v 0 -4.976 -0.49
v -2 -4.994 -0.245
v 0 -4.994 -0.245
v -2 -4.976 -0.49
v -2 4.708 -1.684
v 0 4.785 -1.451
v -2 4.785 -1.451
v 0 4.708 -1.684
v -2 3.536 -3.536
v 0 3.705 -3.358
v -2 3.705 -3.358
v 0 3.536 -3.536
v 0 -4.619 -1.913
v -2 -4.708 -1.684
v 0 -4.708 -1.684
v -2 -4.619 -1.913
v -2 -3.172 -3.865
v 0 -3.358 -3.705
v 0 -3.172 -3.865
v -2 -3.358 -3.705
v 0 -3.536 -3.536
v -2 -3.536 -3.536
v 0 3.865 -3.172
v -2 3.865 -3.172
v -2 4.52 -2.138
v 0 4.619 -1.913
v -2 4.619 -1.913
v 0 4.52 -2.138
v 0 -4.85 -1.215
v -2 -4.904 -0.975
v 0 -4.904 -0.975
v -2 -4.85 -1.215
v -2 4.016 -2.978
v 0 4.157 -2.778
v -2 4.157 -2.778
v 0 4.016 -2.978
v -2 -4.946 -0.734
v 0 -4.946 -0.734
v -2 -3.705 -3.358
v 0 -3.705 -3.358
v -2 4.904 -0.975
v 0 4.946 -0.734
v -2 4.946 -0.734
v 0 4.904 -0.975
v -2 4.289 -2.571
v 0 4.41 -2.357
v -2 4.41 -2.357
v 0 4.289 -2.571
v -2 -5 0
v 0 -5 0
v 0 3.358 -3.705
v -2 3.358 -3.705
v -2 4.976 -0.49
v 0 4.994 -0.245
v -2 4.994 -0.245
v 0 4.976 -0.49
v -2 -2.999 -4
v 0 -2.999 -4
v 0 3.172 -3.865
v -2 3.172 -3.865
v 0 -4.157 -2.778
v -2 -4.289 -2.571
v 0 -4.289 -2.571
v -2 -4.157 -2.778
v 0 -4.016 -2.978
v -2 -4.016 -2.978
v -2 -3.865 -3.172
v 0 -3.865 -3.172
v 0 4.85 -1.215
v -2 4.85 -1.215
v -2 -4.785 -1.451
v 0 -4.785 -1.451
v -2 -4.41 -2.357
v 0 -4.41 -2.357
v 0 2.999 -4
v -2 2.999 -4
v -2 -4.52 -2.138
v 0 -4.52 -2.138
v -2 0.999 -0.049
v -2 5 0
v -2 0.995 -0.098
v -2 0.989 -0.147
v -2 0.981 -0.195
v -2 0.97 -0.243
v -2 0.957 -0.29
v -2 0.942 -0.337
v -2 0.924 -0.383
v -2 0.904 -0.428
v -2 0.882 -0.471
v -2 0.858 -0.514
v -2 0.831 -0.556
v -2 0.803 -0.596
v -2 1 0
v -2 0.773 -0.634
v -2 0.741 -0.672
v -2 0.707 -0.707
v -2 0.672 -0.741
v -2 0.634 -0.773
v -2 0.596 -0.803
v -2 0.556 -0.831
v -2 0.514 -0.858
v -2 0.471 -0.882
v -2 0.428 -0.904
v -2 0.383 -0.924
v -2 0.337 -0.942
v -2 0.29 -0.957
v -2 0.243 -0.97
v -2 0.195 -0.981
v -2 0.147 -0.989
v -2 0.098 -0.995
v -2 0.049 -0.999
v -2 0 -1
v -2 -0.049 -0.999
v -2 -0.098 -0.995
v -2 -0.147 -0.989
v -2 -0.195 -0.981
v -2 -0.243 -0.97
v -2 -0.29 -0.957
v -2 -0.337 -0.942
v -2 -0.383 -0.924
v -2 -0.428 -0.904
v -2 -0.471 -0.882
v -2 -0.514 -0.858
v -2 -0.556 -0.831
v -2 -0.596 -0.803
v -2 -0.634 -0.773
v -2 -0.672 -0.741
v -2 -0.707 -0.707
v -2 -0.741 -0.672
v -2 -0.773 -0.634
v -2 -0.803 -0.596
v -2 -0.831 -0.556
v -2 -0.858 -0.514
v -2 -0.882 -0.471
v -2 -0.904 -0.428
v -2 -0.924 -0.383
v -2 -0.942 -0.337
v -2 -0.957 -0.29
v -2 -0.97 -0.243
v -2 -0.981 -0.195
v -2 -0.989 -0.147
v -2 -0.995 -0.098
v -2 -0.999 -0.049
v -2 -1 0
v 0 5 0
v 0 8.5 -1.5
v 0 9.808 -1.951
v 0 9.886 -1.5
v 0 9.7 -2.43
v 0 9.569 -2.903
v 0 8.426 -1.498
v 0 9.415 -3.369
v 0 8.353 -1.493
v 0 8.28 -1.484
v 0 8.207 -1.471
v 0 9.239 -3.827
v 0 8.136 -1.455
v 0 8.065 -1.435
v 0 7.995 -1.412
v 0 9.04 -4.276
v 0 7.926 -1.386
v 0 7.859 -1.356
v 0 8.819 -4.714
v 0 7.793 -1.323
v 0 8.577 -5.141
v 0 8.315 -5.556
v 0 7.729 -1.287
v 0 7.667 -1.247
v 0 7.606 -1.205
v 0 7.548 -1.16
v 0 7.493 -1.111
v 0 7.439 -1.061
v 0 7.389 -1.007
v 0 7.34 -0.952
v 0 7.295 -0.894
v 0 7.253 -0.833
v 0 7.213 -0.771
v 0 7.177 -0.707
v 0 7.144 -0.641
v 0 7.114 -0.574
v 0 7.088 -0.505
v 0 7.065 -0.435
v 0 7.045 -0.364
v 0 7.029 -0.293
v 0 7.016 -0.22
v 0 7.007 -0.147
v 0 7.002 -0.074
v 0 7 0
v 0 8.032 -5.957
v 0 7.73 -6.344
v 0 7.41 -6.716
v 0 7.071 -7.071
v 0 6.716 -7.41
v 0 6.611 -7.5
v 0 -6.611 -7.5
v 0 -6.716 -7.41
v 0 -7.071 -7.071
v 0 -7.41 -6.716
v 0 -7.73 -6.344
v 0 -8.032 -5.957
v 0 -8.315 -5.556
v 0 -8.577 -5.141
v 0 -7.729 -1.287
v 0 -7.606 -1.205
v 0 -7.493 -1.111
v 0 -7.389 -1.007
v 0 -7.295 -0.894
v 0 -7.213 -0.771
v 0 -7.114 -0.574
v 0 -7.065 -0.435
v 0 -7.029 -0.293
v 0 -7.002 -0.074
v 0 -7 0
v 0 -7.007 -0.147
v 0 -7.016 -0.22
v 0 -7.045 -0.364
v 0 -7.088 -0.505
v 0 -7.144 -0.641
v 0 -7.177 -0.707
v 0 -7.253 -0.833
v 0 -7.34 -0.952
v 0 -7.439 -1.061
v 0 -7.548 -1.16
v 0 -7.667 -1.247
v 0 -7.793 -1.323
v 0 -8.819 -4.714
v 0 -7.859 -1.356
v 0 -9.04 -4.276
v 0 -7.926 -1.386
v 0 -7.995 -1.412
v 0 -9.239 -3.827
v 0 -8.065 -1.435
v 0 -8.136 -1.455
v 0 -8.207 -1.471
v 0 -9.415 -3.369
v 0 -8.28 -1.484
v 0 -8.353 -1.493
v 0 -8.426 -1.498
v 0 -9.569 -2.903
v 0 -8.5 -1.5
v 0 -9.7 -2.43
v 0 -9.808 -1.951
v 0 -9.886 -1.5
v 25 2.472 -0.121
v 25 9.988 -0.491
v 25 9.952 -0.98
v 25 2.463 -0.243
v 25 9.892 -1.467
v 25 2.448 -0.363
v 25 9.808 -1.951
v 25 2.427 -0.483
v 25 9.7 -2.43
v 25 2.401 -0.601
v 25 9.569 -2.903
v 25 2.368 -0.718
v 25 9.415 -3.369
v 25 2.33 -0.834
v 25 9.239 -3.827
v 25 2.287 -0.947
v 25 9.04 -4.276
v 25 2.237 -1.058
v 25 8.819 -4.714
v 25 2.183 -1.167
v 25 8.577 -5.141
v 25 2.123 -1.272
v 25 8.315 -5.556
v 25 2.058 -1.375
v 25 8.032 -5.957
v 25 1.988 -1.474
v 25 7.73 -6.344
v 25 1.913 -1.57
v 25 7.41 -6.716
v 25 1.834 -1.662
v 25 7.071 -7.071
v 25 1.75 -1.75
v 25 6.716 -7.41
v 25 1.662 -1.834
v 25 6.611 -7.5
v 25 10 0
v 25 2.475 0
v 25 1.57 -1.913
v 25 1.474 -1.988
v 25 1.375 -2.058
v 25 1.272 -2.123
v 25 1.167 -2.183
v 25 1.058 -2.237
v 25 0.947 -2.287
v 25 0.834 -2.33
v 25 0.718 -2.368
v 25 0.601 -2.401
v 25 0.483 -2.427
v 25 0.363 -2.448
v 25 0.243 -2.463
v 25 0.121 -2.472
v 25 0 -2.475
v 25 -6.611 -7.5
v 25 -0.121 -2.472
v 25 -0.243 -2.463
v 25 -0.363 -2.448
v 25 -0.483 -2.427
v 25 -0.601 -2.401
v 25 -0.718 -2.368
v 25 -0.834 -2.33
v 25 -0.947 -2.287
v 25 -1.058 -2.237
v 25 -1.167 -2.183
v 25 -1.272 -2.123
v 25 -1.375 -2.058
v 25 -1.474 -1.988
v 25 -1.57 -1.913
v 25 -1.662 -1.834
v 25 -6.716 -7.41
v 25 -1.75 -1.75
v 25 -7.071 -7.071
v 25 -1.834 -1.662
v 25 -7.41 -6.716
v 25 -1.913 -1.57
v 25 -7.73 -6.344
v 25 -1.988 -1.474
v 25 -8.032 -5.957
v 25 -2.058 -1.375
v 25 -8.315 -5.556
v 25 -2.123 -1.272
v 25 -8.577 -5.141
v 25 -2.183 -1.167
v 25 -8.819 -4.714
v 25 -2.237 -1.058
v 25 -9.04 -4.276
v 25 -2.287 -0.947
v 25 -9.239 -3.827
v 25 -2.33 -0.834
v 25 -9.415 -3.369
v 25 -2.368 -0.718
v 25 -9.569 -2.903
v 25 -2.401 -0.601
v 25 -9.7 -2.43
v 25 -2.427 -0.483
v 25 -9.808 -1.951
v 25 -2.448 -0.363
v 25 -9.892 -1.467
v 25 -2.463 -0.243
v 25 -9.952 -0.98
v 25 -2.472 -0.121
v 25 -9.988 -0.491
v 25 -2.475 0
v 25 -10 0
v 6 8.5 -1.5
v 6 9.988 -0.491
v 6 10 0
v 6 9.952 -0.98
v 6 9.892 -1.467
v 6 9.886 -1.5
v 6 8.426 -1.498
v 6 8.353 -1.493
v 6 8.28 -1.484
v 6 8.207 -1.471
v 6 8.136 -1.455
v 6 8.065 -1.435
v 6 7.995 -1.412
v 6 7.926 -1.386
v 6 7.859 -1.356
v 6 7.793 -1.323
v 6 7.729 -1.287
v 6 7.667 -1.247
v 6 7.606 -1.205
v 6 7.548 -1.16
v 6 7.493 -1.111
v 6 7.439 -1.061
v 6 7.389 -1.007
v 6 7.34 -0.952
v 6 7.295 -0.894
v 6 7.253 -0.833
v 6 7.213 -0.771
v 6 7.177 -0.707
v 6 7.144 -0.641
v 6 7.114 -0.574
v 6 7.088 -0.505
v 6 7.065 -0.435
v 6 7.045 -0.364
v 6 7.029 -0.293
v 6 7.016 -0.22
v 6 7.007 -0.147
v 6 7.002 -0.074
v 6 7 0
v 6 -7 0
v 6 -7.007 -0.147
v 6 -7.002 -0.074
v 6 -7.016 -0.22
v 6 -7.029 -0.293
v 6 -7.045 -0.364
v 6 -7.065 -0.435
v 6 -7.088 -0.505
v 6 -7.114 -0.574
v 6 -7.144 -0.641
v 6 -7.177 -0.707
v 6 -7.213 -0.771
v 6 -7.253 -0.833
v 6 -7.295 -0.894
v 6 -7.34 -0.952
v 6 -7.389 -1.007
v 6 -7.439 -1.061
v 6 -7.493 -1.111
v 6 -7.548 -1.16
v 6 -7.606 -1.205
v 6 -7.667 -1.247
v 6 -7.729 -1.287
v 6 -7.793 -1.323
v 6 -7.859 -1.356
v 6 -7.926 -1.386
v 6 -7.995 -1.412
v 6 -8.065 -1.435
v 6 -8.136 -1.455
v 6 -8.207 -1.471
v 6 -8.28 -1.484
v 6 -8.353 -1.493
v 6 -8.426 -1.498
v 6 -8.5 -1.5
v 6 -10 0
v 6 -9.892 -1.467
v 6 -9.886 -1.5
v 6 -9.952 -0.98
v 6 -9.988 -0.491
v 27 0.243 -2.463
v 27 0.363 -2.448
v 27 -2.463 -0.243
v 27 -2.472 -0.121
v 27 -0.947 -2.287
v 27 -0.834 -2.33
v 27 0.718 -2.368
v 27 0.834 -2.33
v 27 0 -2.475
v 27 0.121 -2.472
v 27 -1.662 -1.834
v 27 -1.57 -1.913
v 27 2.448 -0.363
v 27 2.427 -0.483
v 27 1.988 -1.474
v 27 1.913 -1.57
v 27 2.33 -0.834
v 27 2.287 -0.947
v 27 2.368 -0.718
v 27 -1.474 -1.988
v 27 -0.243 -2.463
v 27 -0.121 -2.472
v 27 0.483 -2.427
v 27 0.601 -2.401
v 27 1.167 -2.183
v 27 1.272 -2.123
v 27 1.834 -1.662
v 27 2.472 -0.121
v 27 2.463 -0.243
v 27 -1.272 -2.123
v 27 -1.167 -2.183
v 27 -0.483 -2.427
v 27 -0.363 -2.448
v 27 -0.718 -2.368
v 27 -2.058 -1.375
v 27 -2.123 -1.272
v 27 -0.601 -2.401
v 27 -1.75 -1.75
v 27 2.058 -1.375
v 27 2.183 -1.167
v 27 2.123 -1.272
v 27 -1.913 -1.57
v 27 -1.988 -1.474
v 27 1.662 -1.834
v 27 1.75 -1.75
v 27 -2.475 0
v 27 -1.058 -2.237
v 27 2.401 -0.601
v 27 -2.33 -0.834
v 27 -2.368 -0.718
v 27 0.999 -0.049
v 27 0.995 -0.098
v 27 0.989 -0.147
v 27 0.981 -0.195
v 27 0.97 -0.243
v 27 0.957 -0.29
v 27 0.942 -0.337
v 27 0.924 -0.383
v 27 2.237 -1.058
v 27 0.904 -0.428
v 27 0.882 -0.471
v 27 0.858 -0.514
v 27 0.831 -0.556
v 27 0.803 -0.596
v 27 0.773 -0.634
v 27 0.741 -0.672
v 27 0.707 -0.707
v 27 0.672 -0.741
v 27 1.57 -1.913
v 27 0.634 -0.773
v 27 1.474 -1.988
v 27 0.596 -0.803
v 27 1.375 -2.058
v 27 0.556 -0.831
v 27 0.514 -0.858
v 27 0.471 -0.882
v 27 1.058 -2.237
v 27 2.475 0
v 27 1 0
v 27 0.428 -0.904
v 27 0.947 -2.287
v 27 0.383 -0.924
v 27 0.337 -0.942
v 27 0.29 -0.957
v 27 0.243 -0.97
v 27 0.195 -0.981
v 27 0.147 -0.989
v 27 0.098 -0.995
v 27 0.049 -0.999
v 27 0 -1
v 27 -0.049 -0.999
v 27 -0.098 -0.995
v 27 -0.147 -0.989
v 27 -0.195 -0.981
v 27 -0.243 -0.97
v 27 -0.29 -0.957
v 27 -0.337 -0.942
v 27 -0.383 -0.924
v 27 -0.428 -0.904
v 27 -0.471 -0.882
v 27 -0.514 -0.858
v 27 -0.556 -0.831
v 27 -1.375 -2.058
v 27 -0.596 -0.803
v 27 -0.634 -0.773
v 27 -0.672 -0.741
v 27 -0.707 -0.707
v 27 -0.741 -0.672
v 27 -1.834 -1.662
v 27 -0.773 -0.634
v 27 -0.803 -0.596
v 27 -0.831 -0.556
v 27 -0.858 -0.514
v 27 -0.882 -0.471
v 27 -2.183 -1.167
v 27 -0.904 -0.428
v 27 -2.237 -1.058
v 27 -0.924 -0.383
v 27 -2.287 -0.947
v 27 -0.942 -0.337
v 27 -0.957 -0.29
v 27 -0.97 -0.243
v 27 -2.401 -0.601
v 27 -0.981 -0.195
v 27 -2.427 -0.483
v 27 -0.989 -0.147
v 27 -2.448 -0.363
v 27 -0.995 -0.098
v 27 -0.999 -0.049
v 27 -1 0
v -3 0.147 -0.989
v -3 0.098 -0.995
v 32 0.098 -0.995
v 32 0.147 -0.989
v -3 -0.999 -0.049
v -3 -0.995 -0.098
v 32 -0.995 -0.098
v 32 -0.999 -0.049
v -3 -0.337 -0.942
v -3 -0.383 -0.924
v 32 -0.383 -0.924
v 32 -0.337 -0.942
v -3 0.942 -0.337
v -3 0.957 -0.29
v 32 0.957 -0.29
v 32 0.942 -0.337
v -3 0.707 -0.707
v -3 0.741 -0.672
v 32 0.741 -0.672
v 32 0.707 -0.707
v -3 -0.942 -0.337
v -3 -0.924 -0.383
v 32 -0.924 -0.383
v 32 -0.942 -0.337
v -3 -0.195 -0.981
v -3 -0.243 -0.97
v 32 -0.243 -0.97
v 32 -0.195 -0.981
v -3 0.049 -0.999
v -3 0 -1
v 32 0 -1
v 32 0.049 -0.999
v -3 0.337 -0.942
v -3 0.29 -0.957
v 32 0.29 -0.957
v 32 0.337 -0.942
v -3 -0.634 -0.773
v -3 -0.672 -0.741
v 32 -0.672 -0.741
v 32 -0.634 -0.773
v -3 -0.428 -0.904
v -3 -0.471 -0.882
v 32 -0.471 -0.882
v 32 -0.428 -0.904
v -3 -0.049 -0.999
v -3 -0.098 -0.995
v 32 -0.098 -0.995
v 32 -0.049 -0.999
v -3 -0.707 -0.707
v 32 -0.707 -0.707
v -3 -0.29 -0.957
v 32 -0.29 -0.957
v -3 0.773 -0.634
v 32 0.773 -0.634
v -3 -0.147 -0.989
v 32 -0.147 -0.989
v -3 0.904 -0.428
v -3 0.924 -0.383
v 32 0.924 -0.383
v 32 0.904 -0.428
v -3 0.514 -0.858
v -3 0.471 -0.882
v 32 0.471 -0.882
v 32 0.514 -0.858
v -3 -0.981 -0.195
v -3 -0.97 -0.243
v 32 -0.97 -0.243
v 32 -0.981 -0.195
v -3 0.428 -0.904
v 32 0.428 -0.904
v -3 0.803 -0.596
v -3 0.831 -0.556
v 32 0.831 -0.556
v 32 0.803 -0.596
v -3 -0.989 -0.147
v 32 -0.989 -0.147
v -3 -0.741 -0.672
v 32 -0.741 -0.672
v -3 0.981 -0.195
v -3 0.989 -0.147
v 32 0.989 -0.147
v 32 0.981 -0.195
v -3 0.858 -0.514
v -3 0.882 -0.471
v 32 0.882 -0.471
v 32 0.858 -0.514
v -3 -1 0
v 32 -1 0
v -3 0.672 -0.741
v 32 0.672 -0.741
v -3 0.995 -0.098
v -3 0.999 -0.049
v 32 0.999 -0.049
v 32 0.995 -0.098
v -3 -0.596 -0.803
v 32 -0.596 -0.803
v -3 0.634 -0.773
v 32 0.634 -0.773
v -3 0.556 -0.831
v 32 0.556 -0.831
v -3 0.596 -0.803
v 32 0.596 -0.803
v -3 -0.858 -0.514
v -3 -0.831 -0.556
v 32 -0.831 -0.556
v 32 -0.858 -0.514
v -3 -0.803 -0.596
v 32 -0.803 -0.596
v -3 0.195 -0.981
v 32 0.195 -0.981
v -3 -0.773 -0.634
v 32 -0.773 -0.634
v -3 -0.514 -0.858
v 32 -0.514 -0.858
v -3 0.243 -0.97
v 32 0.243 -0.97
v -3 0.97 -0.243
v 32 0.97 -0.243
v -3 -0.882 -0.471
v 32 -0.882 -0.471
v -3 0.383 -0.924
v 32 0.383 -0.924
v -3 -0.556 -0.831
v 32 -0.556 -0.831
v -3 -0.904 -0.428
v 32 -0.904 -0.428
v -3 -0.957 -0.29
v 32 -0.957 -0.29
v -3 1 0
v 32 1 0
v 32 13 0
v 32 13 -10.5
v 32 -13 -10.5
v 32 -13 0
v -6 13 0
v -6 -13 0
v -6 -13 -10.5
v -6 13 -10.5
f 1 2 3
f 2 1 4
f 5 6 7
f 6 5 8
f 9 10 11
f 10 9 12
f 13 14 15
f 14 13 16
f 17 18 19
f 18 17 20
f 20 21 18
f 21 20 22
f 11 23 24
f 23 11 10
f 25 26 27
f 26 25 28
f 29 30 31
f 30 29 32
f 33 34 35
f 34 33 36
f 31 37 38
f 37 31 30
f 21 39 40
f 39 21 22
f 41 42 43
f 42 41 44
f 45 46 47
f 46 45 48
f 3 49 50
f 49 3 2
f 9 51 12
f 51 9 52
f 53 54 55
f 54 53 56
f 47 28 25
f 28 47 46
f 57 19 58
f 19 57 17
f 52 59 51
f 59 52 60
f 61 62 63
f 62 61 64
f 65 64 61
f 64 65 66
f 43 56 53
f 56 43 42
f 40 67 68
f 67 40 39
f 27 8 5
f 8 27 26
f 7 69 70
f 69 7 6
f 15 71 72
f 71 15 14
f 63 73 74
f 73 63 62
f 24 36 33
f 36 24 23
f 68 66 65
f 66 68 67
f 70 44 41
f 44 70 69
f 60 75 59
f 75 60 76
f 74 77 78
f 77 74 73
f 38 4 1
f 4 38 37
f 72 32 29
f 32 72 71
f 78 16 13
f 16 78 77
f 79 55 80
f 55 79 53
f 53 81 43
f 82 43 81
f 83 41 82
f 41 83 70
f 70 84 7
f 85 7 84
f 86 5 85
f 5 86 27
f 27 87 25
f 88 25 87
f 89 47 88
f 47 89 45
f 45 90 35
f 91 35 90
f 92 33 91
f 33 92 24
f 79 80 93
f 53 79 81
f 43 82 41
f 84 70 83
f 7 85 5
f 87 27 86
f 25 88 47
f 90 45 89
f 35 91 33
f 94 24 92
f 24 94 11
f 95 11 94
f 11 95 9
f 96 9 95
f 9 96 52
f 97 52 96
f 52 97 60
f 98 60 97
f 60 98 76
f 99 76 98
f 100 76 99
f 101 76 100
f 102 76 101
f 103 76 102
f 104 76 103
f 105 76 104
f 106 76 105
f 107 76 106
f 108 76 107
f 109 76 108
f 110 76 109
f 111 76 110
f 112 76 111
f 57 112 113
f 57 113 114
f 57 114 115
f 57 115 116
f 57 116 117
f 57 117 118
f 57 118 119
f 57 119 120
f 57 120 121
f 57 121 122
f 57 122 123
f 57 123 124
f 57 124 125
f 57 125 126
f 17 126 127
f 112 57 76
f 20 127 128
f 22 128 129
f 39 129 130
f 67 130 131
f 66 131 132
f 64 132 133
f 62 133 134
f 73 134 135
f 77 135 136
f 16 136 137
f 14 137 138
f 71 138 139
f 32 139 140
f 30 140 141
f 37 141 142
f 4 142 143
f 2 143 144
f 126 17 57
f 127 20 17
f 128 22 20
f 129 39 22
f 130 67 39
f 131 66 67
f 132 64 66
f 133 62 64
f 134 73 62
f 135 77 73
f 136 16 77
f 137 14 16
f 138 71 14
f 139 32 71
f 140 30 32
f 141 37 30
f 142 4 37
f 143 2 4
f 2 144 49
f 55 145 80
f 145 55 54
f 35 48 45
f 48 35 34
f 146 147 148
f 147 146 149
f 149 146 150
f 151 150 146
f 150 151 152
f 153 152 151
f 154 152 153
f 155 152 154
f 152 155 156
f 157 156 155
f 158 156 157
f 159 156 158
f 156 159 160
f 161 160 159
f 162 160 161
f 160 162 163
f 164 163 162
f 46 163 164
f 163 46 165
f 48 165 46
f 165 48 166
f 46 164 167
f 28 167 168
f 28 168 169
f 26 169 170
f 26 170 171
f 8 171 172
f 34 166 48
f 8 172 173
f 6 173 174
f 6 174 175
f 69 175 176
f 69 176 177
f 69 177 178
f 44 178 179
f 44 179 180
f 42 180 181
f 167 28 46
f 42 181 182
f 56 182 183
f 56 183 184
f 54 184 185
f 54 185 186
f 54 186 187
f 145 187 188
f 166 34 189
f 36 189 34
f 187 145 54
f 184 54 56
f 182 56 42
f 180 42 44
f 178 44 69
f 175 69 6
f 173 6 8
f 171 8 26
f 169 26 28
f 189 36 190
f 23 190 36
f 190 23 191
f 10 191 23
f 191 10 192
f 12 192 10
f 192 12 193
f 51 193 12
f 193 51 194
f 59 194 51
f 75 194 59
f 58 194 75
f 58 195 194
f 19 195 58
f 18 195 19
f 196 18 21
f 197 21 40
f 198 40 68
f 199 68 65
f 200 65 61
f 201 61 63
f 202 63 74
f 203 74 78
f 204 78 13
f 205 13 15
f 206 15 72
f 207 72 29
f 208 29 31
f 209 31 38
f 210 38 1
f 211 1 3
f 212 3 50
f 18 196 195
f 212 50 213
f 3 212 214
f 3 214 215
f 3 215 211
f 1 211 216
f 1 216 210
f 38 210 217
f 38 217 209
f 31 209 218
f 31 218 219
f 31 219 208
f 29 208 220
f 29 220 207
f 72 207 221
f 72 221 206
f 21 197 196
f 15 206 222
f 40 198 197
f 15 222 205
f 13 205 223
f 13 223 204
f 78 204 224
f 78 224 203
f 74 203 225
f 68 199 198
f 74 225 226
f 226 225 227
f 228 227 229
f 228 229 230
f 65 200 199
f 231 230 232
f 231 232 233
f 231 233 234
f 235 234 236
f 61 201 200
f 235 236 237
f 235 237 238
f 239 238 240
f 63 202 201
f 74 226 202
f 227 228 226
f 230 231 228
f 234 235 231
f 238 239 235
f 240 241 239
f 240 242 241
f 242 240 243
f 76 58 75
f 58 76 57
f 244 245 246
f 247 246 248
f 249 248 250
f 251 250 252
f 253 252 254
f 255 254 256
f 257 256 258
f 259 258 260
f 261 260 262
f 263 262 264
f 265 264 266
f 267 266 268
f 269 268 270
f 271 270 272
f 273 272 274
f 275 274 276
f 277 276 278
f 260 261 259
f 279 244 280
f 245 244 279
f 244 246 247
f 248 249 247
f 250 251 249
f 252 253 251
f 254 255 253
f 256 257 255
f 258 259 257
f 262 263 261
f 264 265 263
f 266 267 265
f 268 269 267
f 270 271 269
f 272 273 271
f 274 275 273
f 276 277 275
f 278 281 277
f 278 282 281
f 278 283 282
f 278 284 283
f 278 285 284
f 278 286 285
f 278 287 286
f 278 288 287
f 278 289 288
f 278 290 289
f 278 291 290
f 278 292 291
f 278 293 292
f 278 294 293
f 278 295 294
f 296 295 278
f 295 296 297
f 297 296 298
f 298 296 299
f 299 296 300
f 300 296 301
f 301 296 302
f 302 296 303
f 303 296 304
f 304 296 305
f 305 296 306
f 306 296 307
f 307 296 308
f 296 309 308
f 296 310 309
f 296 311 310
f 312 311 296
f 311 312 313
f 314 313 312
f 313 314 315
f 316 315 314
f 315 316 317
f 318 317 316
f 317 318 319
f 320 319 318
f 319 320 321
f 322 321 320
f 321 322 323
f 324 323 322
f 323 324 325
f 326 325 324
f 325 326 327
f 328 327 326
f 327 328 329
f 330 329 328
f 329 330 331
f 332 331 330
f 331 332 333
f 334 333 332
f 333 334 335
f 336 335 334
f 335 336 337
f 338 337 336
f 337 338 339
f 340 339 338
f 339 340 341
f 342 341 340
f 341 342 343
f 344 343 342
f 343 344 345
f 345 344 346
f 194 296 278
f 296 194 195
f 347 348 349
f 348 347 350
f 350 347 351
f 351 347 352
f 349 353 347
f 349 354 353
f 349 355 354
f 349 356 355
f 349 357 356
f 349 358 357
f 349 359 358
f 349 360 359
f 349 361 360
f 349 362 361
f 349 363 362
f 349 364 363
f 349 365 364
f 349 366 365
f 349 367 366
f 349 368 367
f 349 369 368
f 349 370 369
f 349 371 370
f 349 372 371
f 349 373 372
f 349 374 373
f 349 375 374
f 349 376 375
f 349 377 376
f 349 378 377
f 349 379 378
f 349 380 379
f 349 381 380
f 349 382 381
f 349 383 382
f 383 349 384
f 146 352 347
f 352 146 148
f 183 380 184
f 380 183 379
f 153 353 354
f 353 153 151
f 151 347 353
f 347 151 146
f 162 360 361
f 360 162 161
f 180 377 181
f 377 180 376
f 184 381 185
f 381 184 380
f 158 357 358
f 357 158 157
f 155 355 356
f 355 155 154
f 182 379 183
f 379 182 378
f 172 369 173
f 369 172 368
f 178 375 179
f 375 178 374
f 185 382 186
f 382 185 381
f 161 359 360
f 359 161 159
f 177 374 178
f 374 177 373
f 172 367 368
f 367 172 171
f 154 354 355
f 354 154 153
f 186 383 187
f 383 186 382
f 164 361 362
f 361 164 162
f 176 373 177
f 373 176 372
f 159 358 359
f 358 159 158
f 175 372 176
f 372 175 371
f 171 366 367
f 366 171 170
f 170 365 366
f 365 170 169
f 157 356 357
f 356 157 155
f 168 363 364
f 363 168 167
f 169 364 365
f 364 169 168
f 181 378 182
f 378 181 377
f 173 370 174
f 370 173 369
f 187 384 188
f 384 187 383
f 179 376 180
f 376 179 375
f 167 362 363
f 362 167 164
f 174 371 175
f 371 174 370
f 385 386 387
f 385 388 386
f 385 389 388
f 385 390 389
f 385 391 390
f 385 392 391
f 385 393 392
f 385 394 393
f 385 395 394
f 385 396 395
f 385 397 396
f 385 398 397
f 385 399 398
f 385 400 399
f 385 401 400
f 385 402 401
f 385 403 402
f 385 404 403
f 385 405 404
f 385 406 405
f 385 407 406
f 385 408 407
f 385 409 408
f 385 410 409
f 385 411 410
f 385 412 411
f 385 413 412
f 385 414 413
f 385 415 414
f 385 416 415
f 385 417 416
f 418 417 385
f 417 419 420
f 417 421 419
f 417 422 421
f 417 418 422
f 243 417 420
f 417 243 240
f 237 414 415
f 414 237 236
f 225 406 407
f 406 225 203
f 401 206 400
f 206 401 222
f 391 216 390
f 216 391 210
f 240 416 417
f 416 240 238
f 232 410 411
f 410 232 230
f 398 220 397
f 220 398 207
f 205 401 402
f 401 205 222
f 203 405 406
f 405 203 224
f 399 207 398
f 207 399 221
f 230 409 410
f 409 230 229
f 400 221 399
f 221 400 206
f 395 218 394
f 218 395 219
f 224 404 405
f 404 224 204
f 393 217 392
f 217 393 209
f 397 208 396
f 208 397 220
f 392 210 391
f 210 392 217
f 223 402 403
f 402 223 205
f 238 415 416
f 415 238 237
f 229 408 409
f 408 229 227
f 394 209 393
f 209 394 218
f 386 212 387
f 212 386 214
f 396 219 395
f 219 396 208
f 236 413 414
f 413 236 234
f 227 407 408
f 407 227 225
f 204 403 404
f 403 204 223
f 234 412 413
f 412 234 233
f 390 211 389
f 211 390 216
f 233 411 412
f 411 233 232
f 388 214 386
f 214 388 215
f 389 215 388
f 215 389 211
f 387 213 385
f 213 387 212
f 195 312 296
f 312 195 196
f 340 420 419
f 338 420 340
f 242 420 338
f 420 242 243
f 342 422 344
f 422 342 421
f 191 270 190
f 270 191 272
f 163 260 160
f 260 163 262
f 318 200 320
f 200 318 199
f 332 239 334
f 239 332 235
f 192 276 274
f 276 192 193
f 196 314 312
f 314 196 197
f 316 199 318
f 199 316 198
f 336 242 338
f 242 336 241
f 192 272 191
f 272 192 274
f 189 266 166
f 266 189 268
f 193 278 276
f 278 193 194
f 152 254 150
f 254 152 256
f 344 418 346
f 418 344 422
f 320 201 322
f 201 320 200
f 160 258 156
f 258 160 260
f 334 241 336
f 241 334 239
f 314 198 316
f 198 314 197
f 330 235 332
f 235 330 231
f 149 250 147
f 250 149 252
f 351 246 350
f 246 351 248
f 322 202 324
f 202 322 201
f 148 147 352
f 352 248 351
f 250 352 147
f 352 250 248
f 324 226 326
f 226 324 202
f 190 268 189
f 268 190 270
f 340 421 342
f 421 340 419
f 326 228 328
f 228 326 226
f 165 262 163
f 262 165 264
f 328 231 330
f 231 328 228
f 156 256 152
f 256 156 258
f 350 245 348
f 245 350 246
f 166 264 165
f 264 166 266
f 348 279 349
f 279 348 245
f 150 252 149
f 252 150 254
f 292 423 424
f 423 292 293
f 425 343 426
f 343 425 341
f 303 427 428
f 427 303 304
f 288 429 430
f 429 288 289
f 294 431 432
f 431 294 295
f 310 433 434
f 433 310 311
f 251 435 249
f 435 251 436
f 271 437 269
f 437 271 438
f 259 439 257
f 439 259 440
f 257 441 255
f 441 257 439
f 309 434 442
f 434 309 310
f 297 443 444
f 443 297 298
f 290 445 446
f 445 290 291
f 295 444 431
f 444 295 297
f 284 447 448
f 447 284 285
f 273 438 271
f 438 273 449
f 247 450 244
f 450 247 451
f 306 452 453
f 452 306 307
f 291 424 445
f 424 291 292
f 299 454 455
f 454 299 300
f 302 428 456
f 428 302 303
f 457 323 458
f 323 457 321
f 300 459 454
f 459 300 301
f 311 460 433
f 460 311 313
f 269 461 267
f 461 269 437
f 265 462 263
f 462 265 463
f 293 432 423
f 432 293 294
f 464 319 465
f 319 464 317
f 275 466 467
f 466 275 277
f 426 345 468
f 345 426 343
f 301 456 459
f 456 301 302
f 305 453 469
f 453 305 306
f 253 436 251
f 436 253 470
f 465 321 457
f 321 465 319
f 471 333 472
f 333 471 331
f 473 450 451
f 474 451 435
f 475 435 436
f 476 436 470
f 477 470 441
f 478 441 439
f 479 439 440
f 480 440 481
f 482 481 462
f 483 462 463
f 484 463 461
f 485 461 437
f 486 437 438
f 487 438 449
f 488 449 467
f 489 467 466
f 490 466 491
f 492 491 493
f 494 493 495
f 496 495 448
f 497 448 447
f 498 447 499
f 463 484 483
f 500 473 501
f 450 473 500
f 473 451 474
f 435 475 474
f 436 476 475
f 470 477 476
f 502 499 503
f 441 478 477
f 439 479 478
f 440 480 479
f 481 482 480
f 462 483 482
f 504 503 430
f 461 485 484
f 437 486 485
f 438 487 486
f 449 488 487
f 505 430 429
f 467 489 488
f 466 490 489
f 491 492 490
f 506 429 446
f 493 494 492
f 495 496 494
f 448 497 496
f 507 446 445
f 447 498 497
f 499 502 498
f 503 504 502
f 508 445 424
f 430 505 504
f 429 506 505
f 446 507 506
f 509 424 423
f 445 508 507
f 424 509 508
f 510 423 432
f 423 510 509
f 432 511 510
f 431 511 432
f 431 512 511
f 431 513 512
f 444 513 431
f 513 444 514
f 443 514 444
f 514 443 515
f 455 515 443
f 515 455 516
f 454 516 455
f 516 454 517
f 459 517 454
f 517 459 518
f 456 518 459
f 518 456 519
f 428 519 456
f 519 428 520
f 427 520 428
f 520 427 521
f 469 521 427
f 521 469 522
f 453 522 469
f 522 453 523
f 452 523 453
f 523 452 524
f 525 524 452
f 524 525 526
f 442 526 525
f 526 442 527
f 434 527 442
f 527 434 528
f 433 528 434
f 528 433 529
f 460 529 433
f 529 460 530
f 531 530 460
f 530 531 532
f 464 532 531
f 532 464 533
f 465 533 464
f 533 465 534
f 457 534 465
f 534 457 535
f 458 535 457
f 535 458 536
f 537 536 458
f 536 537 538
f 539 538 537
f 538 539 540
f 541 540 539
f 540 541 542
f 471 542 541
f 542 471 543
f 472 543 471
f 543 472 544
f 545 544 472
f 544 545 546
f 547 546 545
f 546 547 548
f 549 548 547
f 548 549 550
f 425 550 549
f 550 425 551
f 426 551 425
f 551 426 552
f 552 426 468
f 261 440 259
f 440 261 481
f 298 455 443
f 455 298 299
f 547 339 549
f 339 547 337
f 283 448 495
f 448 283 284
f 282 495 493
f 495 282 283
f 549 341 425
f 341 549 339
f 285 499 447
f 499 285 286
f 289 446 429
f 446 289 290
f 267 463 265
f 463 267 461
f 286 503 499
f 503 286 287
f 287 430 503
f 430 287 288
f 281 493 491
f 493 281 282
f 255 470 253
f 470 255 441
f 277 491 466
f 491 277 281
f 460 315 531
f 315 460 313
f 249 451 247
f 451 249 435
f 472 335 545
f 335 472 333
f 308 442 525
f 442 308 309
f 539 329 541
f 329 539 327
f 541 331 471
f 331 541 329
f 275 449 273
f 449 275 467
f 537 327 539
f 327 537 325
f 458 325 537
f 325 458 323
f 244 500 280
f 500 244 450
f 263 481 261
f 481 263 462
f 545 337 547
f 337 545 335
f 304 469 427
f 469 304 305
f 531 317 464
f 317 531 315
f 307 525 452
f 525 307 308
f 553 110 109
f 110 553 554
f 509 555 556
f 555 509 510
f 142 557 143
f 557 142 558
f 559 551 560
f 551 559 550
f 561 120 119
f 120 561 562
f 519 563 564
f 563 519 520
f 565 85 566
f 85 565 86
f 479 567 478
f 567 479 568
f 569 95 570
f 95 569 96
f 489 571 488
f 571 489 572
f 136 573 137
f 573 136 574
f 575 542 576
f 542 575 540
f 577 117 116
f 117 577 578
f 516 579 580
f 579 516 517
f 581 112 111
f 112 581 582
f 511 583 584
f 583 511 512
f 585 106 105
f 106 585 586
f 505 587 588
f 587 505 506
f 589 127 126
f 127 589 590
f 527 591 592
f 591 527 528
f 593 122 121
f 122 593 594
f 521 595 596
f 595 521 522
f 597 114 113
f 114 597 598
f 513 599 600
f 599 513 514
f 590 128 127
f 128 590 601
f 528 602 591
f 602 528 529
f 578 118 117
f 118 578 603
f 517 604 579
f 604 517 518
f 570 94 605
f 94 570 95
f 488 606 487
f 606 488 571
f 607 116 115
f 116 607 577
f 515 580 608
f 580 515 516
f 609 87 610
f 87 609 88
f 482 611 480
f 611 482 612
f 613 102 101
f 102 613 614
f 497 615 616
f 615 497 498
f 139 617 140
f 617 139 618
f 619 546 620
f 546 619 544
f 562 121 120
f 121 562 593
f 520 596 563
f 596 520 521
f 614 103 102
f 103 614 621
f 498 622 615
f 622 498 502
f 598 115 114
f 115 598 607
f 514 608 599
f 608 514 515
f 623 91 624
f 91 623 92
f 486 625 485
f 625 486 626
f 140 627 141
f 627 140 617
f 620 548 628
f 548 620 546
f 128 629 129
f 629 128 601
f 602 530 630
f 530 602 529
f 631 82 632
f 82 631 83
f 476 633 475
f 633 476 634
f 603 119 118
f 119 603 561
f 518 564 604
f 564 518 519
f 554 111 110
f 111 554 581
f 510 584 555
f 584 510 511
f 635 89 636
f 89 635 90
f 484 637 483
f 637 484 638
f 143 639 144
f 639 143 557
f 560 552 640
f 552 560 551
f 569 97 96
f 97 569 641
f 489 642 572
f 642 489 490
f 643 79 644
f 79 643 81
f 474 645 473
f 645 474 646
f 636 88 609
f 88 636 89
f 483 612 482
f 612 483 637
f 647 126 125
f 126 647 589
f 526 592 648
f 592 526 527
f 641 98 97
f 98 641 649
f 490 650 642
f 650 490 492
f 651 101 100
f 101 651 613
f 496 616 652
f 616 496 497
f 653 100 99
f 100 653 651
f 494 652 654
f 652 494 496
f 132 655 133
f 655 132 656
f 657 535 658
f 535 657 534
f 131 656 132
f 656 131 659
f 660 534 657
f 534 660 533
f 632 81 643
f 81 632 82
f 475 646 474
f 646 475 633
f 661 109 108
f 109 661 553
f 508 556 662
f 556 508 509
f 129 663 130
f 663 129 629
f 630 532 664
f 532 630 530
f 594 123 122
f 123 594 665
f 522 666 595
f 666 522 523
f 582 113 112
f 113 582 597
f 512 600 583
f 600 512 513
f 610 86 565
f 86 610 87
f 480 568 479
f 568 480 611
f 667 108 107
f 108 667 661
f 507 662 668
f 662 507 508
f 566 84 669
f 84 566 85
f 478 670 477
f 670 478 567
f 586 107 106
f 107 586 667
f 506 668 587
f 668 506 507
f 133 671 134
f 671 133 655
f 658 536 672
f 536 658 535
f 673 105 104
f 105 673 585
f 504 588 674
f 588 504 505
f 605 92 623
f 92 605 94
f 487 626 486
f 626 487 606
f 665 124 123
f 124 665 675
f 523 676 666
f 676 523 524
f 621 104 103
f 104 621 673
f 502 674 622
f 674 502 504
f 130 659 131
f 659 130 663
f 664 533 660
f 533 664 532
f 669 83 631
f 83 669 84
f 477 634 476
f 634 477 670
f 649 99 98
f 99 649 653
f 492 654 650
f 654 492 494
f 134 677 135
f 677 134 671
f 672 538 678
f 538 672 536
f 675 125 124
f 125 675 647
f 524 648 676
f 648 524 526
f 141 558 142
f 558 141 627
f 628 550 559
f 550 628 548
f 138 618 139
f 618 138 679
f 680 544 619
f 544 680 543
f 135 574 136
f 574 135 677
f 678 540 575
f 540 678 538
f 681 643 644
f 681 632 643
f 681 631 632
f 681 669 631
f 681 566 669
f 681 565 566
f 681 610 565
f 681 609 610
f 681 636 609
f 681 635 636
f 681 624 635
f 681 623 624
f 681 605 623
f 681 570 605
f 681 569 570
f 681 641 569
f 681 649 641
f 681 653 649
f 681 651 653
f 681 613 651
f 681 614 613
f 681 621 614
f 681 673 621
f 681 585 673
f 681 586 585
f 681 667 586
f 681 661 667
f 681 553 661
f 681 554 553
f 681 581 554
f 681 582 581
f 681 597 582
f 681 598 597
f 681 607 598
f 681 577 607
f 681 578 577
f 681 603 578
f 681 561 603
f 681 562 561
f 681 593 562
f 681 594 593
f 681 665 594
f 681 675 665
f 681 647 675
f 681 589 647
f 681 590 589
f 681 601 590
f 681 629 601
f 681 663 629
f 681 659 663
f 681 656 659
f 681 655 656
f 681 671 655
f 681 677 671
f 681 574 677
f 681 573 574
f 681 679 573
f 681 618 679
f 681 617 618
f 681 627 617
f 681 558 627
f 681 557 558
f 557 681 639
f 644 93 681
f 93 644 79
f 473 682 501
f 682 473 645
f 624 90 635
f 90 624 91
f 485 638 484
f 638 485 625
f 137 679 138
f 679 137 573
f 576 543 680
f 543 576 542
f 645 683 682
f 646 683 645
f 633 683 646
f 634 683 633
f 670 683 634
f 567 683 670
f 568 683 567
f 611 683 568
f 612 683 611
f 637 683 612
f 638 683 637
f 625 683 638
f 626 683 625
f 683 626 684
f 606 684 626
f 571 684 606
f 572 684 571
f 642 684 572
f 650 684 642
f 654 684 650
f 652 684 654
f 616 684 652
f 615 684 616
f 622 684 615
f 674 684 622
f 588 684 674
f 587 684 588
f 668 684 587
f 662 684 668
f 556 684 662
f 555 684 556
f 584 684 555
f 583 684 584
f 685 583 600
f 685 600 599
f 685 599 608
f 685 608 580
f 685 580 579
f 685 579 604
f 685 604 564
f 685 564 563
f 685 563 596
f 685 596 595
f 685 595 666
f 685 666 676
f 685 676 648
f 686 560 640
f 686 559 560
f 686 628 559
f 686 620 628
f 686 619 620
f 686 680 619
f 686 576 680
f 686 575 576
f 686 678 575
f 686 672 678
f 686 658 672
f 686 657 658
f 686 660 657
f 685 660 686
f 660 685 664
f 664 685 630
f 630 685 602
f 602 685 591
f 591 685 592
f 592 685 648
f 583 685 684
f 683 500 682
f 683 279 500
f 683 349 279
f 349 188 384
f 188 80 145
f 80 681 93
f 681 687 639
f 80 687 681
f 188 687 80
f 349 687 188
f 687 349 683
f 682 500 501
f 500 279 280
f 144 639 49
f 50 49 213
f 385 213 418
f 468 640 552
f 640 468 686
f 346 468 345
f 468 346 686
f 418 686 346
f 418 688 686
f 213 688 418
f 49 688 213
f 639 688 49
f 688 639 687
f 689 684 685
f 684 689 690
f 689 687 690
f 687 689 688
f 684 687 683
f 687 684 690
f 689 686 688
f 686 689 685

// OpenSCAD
// A block with a pocket for the motor, open at the top.
// The motor is drawn as one solid, with the wiring clearance blocks, and subtracted.
use <../bdc_motor.scad>

// Wall around the pocket (mm)
wall = 3; // [1:0.5:10]

length = motor_length();
back = motor_back_start_x();
width = motor_body_width();

difference() {
    translate([-back - wall, -width / 2 - wall, -motor_body_height() / 2 - wall])
        cube([length + back + 2 * wall, width + 2 * wall, motor_body_height() / 2 + wall]);
    hobby_dc_motor(render_axle_separately=false, render_wiring_clearance_blocks=true);
}
